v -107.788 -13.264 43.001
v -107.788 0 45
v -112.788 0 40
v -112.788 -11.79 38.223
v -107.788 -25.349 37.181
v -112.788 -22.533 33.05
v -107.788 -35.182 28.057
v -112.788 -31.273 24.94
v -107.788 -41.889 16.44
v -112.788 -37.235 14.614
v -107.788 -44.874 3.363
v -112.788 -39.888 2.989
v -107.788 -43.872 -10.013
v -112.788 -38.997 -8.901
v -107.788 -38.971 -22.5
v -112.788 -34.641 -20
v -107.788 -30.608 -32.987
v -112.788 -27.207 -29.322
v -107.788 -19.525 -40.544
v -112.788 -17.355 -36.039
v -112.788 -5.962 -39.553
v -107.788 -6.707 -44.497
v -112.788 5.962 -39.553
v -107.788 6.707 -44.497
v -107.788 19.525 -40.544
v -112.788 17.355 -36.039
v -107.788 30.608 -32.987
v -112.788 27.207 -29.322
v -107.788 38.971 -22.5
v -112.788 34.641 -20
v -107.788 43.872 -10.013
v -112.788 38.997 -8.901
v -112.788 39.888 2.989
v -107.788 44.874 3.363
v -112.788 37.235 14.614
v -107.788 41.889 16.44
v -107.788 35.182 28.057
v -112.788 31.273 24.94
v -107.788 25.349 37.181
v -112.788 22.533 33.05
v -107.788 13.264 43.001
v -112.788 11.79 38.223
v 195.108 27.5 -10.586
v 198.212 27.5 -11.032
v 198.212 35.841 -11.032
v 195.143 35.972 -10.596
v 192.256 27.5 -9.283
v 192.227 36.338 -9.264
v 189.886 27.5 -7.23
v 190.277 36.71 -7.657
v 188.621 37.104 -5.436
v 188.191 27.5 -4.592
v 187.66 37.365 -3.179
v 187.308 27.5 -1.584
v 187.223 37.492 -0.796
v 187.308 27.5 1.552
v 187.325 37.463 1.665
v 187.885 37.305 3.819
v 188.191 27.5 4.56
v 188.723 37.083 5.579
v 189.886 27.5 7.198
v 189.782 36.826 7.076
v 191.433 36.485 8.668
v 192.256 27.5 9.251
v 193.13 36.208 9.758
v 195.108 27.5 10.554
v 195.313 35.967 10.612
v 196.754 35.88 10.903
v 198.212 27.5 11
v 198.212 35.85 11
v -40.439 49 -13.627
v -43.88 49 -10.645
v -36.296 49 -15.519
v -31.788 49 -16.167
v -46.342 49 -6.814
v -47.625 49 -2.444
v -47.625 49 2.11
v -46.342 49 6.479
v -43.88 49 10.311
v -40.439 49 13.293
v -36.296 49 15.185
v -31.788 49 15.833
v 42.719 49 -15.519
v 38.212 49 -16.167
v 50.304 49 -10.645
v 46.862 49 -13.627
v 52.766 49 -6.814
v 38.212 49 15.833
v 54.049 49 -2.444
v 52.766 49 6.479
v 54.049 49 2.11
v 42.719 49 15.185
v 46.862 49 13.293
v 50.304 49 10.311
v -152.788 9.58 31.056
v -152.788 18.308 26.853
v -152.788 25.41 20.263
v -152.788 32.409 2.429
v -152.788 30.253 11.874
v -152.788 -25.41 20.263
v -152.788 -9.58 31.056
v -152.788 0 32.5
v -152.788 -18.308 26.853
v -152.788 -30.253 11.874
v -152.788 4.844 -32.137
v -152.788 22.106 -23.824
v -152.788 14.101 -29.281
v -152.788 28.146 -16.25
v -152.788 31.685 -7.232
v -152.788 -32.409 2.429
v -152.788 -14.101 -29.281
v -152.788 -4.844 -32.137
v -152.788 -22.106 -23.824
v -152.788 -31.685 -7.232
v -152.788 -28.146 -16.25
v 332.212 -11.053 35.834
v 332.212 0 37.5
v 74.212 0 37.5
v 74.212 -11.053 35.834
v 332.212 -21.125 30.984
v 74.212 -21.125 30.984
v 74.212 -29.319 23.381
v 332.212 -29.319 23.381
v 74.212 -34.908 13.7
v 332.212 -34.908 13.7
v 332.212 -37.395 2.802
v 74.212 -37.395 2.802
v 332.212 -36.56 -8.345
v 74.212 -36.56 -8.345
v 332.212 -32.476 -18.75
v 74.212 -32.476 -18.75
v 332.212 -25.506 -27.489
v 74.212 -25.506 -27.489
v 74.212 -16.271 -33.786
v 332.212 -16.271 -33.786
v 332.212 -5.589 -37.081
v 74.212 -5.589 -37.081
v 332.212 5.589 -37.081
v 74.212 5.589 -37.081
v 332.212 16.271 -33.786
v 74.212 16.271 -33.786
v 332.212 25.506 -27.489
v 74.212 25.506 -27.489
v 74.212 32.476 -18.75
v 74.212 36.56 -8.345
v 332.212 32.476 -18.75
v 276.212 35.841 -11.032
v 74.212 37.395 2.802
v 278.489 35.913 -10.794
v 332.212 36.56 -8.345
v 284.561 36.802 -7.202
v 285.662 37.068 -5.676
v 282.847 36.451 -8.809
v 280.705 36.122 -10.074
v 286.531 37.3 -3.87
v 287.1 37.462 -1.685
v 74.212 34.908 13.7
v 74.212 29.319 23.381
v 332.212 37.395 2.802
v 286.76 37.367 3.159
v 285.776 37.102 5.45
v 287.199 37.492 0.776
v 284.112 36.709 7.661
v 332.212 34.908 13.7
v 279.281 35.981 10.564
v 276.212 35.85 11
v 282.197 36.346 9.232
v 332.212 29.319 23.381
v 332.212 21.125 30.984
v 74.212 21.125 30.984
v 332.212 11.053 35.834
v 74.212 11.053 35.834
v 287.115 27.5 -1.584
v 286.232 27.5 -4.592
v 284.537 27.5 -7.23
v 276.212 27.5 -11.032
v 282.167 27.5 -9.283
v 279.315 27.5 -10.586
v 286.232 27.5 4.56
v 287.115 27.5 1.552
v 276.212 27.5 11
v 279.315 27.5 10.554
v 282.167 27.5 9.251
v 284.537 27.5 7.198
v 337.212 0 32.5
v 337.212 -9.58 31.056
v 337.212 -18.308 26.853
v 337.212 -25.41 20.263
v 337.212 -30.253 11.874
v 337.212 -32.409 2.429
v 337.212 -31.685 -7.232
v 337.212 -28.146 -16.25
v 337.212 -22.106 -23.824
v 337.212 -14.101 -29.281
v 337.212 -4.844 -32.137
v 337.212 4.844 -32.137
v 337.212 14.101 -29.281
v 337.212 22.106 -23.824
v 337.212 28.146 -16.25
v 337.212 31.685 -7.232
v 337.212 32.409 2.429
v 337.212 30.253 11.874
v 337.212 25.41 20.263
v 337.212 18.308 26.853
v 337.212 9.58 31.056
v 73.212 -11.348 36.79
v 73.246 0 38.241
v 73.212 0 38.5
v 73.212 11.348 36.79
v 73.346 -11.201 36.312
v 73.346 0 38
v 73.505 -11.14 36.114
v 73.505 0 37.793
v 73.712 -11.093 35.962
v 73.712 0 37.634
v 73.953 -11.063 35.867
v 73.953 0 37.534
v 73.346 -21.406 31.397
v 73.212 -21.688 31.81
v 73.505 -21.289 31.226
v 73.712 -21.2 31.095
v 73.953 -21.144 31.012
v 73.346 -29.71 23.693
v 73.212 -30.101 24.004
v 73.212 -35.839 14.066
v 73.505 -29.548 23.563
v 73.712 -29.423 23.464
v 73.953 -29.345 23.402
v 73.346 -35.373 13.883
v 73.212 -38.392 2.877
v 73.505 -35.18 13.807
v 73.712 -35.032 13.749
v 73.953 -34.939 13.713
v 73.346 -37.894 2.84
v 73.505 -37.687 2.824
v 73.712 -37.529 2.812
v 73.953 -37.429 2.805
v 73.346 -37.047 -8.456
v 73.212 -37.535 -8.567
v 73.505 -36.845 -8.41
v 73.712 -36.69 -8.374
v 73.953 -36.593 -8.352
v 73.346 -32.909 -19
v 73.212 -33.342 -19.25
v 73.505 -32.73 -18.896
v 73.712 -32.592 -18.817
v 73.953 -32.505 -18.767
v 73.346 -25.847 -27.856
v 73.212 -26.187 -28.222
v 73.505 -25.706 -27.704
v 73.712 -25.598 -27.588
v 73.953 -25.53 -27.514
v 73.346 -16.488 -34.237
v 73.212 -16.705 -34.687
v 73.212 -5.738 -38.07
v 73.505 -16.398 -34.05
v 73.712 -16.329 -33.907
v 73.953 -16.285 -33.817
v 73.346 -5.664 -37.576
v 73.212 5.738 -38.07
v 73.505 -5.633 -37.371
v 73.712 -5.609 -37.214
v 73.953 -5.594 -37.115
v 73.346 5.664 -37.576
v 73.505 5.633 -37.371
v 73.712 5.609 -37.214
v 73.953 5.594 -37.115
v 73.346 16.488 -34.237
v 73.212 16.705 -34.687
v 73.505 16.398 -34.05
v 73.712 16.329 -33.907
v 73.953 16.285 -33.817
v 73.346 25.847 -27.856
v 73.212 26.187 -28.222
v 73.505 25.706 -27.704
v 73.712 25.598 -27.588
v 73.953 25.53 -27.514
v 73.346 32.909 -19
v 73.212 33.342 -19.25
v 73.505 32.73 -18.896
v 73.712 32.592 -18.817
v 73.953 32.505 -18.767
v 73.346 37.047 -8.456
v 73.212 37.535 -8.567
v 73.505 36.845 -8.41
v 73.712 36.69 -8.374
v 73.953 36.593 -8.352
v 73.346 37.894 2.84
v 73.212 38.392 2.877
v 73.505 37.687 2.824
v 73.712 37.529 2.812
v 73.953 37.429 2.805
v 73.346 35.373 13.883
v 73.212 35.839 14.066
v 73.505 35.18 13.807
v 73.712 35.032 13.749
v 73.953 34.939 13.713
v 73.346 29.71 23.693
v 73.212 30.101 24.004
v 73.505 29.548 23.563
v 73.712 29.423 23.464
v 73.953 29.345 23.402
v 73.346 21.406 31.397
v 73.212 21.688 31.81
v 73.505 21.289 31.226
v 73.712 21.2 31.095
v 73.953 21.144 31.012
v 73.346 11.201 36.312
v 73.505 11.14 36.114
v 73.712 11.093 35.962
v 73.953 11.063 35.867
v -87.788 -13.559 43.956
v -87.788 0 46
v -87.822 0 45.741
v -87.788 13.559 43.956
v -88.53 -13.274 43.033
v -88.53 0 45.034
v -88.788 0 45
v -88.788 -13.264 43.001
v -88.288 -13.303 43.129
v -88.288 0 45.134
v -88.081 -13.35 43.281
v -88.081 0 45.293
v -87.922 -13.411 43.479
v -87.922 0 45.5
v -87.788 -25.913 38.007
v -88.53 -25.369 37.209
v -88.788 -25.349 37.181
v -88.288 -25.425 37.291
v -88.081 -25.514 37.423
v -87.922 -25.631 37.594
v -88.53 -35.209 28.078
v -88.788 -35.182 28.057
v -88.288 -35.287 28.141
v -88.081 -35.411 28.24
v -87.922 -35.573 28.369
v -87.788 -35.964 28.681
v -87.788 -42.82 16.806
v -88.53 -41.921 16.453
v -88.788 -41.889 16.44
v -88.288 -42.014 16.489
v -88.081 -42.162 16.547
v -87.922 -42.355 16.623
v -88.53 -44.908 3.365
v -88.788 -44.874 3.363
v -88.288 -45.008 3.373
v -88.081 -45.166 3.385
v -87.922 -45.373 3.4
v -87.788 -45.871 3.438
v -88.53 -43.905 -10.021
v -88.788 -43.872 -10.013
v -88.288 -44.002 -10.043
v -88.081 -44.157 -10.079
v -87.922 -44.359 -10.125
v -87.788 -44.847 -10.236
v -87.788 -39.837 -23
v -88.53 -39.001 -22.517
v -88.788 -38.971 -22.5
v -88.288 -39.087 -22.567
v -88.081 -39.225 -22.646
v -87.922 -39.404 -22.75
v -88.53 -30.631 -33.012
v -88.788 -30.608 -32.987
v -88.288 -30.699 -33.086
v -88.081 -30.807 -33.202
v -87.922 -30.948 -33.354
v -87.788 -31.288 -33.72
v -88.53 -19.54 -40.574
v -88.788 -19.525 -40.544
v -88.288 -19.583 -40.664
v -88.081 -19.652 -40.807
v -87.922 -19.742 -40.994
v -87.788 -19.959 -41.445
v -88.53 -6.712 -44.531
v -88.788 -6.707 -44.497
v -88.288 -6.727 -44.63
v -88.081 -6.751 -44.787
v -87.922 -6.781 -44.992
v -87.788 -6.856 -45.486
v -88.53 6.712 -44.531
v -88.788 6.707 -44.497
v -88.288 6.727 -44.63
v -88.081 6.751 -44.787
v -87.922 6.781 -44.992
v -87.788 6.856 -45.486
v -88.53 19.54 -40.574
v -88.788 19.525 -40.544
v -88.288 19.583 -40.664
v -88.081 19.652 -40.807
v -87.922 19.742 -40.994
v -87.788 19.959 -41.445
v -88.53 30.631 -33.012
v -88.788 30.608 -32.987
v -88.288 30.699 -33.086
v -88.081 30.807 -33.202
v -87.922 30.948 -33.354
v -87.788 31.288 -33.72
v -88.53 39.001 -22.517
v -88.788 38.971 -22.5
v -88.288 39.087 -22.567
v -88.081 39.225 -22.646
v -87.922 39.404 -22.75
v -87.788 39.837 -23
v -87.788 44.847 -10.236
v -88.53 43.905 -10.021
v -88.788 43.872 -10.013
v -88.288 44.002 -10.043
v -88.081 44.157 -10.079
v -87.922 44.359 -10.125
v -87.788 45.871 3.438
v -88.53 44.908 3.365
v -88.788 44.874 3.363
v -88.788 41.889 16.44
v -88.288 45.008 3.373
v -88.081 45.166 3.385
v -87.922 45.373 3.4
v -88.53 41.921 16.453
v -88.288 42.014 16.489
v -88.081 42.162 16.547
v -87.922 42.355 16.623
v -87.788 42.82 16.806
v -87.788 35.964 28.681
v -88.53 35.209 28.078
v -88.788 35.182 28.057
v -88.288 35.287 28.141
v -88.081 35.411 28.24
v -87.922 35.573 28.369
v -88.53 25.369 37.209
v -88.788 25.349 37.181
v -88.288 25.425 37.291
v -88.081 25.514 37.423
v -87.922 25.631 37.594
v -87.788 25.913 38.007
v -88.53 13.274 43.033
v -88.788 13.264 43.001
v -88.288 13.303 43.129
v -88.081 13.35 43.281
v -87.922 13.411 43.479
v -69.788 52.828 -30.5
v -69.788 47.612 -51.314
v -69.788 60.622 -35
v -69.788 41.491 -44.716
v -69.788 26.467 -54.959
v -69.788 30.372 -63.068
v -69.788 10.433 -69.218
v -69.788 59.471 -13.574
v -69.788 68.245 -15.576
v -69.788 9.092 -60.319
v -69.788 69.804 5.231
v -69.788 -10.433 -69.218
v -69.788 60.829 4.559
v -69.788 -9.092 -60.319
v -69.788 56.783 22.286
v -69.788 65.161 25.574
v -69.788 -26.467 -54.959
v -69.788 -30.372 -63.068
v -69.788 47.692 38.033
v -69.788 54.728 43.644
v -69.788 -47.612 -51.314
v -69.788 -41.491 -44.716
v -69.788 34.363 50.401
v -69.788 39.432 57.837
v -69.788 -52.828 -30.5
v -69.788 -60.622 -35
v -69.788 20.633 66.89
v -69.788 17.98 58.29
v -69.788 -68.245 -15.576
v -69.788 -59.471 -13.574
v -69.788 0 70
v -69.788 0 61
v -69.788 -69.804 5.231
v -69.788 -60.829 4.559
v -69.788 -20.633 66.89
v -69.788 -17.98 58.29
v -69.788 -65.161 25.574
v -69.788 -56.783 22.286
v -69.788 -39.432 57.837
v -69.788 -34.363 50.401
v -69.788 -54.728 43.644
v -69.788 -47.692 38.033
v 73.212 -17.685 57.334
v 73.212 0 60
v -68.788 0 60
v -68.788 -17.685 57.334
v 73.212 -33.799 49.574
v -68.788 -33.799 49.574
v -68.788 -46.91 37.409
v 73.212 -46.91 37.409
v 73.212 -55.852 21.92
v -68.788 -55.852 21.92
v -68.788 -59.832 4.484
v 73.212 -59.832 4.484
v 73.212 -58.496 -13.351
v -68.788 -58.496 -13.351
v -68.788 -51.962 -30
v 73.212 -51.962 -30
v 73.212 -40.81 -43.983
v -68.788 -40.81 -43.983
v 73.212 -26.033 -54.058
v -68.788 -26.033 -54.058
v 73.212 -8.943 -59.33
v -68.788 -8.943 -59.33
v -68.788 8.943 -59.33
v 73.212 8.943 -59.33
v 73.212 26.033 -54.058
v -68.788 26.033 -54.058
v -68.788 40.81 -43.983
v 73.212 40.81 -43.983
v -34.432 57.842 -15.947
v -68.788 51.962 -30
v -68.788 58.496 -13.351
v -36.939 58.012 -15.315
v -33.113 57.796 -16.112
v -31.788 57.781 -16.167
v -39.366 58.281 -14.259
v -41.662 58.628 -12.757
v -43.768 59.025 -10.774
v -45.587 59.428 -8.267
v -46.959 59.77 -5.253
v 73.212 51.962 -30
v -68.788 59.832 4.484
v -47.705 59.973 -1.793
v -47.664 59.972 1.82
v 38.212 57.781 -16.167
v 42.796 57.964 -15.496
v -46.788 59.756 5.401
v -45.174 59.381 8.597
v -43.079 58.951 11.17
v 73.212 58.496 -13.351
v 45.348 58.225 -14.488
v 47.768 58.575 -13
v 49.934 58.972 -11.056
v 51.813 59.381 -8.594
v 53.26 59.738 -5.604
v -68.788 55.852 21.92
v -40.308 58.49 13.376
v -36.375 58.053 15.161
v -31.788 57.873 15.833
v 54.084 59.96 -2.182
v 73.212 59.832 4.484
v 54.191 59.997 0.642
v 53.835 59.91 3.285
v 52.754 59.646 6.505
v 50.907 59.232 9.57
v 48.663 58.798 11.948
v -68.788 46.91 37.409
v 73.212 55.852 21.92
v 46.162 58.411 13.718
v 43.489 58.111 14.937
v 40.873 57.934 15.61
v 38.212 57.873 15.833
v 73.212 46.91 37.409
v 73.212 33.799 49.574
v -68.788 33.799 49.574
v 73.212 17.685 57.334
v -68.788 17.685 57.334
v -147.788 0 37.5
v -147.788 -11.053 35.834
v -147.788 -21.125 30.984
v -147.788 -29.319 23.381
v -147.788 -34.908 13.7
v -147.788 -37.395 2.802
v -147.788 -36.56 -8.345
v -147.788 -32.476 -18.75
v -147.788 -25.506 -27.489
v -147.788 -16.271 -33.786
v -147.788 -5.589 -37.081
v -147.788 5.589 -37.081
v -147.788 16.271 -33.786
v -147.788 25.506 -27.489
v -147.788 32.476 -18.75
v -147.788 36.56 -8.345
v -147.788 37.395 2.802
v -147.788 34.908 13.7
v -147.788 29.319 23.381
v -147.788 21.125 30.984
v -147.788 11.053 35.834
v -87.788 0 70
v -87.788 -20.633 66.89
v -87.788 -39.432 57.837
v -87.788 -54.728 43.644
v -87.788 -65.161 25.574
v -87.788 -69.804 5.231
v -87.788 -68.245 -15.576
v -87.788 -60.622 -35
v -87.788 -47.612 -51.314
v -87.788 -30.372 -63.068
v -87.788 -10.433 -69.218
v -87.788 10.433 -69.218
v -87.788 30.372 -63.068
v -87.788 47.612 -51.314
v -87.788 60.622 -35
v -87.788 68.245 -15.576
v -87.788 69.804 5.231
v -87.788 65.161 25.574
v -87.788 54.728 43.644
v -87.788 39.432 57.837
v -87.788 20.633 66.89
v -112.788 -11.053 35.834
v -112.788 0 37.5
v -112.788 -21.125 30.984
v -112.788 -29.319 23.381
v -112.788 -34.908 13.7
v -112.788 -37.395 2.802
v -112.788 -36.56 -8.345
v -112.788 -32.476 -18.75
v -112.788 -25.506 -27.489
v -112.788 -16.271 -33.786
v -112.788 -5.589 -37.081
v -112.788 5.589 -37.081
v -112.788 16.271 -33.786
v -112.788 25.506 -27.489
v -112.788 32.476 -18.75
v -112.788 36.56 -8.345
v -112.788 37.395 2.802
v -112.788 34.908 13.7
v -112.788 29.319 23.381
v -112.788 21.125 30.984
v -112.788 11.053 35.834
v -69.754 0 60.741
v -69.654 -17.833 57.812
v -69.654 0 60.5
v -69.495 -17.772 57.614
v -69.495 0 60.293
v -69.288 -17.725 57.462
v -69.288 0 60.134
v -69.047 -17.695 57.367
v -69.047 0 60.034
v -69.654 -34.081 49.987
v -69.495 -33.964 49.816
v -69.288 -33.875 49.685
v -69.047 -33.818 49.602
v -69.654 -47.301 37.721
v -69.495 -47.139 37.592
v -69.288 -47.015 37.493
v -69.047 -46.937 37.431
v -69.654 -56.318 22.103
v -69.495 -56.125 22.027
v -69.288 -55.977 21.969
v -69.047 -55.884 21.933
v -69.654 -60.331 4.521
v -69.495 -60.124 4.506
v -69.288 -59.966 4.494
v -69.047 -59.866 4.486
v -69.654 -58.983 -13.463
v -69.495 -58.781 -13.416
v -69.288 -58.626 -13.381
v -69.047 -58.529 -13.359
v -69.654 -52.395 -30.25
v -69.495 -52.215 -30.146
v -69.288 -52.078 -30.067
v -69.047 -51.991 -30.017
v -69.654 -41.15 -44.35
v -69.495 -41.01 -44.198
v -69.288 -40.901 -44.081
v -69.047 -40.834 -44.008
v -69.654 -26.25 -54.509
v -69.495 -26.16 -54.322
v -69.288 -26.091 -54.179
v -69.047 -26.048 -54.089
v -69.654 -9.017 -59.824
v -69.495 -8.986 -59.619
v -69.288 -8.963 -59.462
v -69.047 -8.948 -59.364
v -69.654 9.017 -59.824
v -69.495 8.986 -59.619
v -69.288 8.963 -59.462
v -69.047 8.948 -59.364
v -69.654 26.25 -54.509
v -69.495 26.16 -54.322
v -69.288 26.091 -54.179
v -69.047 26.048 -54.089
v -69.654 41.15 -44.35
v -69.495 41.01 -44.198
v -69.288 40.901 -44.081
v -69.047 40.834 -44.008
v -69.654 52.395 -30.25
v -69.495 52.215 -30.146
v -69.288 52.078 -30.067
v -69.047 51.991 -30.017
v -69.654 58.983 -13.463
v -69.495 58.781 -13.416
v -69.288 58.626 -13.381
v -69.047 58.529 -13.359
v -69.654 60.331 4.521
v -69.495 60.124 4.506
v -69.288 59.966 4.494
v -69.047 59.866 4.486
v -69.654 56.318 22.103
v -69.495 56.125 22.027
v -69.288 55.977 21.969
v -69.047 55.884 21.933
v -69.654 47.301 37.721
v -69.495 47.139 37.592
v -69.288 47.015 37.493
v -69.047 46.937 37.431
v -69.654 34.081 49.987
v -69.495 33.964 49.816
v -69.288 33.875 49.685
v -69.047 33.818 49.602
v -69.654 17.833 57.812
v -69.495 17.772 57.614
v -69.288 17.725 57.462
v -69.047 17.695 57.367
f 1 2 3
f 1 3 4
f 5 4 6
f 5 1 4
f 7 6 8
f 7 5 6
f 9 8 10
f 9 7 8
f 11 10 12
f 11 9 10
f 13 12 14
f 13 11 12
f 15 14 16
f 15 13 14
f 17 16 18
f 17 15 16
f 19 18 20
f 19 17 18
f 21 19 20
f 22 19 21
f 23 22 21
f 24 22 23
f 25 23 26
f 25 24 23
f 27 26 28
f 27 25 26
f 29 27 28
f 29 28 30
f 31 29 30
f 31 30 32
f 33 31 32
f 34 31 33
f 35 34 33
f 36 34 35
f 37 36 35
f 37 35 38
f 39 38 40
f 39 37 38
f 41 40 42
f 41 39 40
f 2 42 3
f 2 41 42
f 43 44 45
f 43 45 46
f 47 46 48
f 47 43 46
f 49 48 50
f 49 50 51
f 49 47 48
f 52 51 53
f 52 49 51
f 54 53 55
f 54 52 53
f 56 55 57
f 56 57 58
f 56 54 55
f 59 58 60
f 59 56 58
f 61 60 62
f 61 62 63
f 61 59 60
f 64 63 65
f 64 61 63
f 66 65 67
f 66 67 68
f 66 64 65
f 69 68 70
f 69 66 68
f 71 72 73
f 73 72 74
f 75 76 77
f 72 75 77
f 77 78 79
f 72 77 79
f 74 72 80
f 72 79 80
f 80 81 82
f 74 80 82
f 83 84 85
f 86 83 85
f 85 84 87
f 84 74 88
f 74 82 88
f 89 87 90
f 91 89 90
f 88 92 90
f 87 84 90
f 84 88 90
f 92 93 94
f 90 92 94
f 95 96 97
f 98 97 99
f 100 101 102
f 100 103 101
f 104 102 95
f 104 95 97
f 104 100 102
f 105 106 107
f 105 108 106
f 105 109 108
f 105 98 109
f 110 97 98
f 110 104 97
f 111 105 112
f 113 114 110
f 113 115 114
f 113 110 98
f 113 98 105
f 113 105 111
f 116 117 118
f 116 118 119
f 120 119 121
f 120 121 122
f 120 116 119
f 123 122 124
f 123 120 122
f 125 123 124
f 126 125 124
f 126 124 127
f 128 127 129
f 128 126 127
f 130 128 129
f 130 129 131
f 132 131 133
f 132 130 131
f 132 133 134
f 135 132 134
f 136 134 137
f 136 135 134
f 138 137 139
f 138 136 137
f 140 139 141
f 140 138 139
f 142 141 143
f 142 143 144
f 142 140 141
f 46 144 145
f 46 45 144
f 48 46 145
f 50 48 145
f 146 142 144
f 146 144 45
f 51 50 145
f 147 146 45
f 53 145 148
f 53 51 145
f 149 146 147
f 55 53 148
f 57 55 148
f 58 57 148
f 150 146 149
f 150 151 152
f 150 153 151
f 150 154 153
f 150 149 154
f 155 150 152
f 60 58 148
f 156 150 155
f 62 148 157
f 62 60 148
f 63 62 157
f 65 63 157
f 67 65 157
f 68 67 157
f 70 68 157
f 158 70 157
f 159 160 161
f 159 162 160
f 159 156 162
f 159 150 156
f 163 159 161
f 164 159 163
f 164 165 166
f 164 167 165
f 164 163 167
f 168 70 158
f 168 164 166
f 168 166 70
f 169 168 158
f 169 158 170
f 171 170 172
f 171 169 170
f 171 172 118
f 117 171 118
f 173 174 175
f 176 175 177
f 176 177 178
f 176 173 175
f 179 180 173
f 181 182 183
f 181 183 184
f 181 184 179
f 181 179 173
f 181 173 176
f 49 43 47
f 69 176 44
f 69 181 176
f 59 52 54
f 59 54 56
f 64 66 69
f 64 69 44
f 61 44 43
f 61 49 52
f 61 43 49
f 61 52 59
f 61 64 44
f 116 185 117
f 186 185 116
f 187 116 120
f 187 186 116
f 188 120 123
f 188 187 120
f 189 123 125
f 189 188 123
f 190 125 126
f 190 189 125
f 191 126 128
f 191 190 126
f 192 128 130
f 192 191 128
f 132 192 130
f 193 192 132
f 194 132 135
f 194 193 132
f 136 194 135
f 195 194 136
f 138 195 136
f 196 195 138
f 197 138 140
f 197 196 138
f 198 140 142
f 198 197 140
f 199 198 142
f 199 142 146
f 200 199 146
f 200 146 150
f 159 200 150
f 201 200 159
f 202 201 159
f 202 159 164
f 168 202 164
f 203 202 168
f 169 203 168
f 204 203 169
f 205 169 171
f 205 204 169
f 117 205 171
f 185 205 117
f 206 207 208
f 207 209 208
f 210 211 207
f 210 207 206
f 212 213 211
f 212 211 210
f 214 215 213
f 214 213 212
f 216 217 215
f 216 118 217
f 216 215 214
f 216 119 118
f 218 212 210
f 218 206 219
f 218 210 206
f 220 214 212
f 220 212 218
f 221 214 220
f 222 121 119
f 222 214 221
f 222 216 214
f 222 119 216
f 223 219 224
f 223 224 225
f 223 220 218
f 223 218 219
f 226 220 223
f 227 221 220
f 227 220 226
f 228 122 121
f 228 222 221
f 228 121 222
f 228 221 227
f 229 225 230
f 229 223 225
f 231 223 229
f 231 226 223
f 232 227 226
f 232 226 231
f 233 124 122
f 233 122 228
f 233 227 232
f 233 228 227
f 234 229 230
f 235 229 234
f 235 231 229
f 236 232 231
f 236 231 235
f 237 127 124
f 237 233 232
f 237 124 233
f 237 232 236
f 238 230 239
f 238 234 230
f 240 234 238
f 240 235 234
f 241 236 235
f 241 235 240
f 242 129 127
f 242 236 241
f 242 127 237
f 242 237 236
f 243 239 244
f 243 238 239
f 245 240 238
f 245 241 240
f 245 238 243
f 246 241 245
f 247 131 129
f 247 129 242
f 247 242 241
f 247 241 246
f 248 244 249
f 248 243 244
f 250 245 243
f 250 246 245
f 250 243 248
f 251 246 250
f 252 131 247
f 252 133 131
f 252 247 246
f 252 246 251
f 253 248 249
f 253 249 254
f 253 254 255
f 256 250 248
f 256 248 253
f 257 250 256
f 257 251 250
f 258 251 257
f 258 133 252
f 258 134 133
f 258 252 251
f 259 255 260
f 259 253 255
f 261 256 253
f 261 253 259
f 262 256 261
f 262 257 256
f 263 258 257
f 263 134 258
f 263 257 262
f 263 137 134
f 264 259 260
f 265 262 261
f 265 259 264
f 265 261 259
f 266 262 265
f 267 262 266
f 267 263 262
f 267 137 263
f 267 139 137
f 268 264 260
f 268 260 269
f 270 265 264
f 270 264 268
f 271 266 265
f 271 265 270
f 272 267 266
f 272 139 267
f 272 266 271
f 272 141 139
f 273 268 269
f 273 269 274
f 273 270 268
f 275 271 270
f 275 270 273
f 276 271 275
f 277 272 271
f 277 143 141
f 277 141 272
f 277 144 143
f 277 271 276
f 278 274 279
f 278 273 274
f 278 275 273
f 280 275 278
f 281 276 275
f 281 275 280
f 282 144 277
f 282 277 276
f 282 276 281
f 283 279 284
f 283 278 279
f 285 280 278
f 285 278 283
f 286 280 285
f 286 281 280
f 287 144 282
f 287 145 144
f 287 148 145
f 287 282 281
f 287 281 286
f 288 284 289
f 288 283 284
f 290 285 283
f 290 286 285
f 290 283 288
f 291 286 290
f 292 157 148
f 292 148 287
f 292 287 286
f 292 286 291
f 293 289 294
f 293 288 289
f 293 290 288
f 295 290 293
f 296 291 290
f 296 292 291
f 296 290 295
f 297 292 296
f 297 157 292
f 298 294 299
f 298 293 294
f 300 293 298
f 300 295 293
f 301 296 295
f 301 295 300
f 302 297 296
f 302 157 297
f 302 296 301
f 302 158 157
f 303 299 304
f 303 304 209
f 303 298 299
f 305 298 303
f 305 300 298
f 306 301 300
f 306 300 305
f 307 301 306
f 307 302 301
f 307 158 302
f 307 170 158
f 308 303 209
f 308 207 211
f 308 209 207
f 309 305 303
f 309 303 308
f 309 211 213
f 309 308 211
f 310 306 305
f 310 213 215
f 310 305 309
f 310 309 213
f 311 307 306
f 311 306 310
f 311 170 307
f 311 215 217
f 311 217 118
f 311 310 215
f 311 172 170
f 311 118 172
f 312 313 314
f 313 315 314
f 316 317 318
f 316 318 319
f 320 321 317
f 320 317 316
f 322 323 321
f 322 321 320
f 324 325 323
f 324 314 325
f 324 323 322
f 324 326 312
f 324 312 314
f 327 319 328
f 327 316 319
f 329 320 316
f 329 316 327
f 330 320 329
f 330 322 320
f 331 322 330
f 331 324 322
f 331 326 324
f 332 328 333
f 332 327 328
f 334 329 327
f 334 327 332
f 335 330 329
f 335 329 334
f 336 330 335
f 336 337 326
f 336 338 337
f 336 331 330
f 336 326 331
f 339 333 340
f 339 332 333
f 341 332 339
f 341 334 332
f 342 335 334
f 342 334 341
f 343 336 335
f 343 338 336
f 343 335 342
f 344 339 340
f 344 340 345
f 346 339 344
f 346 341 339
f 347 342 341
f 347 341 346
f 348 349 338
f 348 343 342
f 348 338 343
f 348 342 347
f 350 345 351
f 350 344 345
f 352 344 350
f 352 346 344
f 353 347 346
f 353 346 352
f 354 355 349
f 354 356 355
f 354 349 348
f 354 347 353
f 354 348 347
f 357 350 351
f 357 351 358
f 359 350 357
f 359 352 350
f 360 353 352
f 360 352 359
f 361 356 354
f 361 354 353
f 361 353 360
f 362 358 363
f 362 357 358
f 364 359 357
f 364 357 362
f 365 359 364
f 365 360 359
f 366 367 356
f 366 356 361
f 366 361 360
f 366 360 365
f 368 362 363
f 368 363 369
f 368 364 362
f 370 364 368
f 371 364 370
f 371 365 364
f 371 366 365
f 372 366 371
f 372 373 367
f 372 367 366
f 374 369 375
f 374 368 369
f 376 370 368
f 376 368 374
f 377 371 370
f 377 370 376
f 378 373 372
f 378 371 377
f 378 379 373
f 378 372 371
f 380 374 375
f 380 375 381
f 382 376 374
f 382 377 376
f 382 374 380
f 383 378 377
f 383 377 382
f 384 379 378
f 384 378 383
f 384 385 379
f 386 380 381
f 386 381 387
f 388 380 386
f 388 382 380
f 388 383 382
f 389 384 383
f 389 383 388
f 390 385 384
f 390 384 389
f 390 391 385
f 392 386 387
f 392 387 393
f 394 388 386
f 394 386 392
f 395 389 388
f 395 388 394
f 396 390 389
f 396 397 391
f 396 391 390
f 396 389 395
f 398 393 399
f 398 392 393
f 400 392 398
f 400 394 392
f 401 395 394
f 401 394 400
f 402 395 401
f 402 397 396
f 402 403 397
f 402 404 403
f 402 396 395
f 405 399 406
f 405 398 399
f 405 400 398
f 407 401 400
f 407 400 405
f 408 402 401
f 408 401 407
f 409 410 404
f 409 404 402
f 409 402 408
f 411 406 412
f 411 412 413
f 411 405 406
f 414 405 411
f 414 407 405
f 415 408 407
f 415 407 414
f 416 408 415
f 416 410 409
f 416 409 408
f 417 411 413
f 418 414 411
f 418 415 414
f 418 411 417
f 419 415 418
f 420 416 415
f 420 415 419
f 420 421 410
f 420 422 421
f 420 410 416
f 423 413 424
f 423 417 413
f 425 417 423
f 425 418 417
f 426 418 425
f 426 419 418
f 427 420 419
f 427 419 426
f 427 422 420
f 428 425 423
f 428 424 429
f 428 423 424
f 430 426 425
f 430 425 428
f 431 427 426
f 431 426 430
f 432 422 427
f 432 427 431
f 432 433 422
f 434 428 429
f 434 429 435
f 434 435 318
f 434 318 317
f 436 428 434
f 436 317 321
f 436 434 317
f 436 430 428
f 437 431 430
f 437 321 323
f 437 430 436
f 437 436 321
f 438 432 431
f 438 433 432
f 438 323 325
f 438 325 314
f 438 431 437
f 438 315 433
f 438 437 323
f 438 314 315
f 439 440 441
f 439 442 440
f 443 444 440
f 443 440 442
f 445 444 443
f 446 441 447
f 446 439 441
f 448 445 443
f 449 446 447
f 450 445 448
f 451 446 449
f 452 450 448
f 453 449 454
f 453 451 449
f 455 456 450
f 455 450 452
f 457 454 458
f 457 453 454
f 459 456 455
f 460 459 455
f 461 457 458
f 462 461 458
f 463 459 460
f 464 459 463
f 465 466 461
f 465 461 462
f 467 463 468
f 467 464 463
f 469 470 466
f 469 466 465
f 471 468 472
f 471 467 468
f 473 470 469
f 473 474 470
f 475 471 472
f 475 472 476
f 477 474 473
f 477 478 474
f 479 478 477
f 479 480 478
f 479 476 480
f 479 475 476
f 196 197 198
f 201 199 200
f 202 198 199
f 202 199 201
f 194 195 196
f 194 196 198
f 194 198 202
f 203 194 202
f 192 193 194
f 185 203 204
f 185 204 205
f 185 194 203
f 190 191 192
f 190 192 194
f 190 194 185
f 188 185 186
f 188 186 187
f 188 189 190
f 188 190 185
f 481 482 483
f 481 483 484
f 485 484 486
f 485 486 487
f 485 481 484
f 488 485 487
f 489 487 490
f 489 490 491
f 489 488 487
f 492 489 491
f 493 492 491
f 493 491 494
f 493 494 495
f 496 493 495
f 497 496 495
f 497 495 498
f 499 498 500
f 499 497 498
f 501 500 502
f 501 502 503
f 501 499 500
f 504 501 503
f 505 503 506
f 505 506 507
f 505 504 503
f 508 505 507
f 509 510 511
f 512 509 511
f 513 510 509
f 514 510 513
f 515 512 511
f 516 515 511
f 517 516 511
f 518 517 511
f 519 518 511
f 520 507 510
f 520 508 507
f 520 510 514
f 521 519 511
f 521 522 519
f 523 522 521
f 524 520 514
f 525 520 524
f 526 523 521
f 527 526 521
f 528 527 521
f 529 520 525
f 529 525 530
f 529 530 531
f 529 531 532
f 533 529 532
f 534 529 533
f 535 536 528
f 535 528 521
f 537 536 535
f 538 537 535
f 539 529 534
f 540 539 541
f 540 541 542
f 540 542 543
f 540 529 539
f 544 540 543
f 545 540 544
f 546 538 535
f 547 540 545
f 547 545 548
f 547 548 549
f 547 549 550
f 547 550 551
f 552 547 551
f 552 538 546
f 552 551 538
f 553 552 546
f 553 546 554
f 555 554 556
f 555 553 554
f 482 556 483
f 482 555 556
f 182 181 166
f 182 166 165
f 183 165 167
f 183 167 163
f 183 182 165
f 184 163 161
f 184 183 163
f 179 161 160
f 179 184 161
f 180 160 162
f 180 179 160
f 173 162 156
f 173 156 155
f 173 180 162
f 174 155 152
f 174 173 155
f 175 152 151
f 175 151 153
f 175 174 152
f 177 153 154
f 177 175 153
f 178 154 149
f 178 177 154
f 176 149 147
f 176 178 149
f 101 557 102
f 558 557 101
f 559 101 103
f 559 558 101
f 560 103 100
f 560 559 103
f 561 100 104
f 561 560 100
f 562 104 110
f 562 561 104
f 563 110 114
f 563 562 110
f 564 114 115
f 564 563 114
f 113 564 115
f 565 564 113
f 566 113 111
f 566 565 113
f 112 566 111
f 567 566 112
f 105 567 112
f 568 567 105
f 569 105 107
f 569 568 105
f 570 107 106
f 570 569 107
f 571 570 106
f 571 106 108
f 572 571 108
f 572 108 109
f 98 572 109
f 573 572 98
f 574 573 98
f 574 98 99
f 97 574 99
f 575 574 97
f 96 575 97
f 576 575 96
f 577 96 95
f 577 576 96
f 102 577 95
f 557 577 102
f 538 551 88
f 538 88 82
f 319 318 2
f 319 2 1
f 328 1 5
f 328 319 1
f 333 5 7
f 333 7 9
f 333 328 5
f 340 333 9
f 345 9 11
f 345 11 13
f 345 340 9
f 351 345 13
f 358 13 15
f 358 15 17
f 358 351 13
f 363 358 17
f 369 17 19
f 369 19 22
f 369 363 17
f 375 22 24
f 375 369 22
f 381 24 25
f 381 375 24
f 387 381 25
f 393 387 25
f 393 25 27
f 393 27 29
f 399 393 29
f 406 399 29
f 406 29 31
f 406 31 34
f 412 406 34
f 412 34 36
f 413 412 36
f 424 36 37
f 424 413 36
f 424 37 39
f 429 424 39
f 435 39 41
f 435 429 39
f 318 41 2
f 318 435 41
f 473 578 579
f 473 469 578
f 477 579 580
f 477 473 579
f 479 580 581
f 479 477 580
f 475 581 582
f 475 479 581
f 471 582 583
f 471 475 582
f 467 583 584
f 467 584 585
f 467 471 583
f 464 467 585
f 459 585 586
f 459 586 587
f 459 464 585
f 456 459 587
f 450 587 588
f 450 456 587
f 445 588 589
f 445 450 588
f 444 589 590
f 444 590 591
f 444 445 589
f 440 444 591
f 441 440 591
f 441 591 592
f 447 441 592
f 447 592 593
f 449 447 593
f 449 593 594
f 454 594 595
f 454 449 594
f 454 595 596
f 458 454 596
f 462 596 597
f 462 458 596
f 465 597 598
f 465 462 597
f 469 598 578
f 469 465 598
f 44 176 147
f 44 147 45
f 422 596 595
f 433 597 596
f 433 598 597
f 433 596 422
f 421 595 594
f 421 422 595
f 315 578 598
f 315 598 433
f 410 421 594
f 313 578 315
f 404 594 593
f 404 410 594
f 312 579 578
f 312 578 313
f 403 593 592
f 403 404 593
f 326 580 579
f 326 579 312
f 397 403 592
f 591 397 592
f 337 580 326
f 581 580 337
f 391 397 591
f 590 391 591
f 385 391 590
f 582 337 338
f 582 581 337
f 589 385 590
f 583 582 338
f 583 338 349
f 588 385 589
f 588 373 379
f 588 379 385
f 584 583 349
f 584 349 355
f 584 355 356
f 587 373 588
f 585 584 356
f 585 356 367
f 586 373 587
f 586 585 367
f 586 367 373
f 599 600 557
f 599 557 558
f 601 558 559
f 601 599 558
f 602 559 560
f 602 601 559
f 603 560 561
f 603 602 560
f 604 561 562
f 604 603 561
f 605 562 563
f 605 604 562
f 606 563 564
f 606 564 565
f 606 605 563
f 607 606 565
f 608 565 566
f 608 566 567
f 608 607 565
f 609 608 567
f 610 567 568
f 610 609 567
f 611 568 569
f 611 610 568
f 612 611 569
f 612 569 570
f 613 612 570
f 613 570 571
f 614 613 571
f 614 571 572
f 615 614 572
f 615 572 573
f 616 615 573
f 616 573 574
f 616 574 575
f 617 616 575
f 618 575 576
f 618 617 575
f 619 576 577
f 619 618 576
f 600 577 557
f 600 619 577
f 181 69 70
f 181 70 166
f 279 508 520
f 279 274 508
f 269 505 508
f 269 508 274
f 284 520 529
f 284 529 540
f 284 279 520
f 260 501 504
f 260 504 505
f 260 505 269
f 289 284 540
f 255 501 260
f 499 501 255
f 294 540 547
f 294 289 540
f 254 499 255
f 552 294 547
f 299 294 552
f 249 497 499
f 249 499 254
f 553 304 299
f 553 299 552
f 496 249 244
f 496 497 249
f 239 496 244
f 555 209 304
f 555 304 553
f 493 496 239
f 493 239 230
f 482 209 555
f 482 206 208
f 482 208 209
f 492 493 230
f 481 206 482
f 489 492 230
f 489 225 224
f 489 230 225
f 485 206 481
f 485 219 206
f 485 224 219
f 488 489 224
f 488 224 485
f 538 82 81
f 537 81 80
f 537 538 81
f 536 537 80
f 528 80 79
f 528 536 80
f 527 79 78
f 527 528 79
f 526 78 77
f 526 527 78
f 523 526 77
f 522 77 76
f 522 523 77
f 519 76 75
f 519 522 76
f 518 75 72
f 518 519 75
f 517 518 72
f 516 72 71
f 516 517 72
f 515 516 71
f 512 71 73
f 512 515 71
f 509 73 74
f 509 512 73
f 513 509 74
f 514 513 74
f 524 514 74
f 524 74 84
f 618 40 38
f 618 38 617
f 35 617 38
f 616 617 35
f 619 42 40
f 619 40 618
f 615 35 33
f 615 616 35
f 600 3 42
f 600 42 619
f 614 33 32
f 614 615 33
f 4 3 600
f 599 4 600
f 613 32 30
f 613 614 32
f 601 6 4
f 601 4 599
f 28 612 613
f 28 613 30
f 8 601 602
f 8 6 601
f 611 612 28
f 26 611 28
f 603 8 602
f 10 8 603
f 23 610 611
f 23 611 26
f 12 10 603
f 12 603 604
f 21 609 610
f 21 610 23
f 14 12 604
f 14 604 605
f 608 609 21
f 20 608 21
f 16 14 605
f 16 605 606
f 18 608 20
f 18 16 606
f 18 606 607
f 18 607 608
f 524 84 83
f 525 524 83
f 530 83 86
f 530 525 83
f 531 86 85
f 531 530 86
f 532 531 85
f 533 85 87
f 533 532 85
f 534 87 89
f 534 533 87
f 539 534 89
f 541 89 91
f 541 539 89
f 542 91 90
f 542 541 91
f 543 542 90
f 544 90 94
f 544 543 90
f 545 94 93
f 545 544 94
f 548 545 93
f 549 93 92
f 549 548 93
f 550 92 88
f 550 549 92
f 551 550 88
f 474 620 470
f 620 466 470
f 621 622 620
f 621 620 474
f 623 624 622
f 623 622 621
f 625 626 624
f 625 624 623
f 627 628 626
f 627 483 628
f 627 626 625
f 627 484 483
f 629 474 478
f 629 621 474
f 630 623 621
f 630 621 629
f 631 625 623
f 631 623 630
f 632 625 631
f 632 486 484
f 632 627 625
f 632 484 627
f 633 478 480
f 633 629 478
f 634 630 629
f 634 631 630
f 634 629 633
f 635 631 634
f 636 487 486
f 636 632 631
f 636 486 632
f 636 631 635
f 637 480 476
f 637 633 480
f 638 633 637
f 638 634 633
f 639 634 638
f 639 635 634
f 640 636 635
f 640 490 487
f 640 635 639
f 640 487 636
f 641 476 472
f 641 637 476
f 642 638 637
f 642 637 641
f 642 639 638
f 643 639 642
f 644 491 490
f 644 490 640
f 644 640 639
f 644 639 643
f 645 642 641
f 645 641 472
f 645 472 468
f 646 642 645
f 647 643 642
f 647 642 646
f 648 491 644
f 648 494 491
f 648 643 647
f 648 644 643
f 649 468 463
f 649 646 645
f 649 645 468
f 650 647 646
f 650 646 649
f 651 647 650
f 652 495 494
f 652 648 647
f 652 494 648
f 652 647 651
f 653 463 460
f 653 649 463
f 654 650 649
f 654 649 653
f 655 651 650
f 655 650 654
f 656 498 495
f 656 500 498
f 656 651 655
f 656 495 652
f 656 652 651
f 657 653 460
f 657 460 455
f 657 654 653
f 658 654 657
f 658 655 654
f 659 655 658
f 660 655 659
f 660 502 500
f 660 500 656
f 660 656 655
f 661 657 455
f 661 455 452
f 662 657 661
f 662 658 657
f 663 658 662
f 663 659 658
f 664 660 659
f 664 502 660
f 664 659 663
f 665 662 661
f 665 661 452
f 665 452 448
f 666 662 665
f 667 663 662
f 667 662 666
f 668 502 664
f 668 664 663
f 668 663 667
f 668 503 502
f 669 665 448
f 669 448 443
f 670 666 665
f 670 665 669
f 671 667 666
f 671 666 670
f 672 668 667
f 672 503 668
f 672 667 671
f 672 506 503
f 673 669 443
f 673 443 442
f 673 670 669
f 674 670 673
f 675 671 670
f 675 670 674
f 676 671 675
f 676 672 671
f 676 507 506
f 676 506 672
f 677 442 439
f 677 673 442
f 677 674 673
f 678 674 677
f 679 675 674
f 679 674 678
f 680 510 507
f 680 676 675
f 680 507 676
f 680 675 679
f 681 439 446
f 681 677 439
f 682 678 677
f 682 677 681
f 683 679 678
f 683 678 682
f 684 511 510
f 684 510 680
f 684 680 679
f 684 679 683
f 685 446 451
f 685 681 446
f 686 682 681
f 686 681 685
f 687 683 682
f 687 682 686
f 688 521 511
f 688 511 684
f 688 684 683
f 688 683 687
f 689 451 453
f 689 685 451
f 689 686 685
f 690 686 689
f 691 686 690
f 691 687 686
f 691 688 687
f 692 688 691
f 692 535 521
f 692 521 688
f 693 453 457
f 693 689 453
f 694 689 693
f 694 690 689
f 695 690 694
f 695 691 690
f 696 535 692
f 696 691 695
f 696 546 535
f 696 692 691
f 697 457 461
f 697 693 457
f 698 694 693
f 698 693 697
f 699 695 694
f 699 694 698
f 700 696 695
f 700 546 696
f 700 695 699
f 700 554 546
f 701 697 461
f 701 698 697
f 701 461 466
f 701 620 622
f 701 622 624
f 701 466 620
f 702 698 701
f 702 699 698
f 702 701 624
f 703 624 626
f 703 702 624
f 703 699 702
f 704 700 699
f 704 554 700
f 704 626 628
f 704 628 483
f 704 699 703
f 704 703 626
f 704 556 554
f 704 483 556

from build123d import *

# Parameters (mm, degrees)
CUT_EXTRUDE_1_DEPTH      = 11
CUT_EXTRUDE_2_DEPTH      = 359.209373116
CUT_EXTRUDE_2_DEPTH_BACK = 1
CHAMFER_1_SIZE           = 5
FILLET_1_R               = 1


with BuildPart() as part:
    # 草图1 → 旋转1 (revolve)
    with BuildSketch(Plane.XY, mode=Mode.PRIVATE) as revolve_1_sk:
        Polygon((-152.788338001, 0), (-152.788338001, 37.5), (-112.788338001, 37.5), (-112.788338001, 45), (-87.788338001, 45), (-87.788338001, 70), (-69.788338001, 70), (-69.788338001, 60), (73.211661999, 60), (73.211661999, 37.5), (337.211661999, 37.5), (337.211661999, 0), align=None)
    revolve(revolve_1_sk.sketch.rotate(Axis((-105.28115942, 0, 0), (1, 0, 0)), 90), axis=Axis((-105.28115942, 0, 0), (1, 0, 0)))

    # 草图2 → 切除-拉伸1 (cut)
    with BuildSketch(Plane(origin=(0, 60, 0), x_dir=(-1, 0, 0), z_dir=(0, 1, 0))):
        with BuildLine():
            Line((-38.211661999, 15.832796851), (31.788338001, 15.832796851))
            ThreePointArc((31.788338001, 15.832796851), (47.788338001, -0.167203149), (31.788338001, -16.167203149))
            Line((31.788338001, -16.167203149), (-38.211661999, -16.167203149))
            ThreePointArc((-38.211661999, -16.167203149), (-54.211661999, -0.167203149), (-38.211661999, 15.832796851))
        make_face()
    extrude(amount=-CUT_EXTRUDE_1_DEPTH, mode=Mode.SUBTRACT)

    # 草图3 → 切除-拉伸2 (cut, two sides: drawn at the far end of the back side and taken through both)
    with BuildSketch(Plane(origin=(0, 28.5, 0), x_dir=(-1, 0, 0), z_dir=(0, 1, 0)).offset(-CUT_EXTRUDE_2_DEPTH_BACK)):
        with BuildLine():
            Line((-198.211661999, 11), (-276.211661999, 11))
            ThreePointArc((-276.211661999, 11), (-287.227527816, -0.015865818), (-276.211661999, -11.031731635))
            Line((-276.211661999, -11.031731635), (-198.211661999, -11.031731635))
            ThreePointArc((-198.211661999, -11.031731635), (-187.195796181, -0.015865818), (-198.211661999, 11))
        make_face()
    extrude(amount=CUT_EXTRUDE_2_DEPTH + CUT_EXTRUDE_2_DEPTH_BACK, mode=Mode.SUBTRACT)

    # 倒角1
    chamfer_1_edges = [part.edges().sort_by_distance(p)[0] for p in [
        (-112.788338001, 0, -45),
        (-152.788338001, 0, -37.5),
        (337.211661999, 0, -37.5),
    ]]
    chamfer(chamfer_1_edges, length=CHAMFER_1_SIZE)

    # 圆角1
    fillet_1_edges = [part.edges().sort_by_distance(p)[0] for p in [
        (-69.788338001, 0, -60),
        (-87.788338001, 0, -45),
        (73.211661999, 0, -37.5),
    ]]
    fillet(fillet_1_edges, radius=FILLET_1_R)


solid = part.part
